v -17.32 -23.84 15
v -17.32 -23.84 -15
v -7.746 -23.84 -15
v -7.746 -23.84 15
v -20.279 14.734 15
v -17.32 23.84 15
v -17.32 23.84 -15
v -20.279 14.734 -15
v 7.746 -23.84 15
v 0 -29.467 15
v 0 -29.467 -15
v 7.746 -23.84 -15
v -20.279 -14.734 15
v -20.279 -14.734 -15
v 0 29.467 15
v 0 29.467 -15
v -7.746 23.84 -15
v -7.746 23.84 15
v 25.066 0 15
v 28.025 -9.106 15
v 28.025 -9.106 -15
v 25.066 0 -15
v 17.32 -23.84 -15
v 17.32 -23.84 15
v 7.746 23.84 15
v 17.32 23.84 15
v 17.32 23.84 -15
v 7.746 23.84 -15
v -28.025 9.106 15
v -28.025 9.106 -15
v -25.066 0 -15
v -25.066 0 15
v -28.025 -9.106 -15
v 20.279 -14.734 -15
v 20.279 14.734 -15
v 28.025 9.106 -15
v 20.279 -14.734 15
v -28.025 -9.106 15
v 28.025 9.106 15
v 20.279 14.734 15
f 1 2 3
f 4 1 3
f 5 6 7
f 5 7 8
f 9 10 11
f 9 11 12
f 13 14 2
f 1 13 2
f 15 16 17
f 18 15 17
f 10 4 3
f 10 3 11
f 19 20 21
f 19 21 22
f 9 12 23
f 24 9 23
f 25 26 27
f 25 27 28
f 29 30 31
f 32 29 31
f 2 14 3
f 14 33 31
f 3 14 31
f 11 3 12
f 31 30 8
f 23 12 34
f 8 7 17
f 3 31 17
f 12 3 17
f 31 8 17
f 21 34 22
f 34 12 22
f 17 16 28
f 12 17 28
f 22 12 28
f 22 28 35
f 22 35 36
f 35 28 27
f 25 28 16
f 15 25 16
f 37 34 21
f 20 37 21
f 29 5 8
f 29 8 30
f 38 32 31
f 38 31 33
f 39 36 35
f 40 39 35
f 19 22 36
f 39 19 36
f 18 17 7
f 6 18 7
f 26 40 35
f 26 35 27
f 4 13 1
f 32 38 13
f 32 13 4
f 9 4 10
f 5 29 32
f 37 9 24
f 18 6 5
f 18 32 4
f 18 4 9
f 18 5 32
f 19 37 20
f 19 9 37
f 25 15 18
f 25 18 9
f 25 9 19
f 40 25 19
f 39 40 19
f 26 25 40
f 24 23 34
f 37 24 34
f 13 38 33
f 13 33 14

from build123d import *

# Parameters (mm, degrees)
F5_DEPTH = 30
F6_DEPTH = 30


with BuildPart() as f5:
    # F1 (on offset) → F5 (new body)
    with BuildSketch(Plane.XY.offset(15)):
        Polygon((17.3205, 23.839623), (-17.3205, 23.839623), (-28.025158, -9.105926), (0, -29.467395), (28.025158, -9.105926), align=None)
    extrude(amount=-F5_DEPTH)

    # F3 (on offset) → F6 (join)
    with BuildSketch(Plane.XY.offset(-15)):
        Polygon((-17.3205, -23.839623), (17.3205, -23.839623), (28.025158, 9.105926), (0, 29.467395), (-28.025158, 9.105926), align=None)
    extrude(amount=F6_DEPTH)


solid = f5.part
